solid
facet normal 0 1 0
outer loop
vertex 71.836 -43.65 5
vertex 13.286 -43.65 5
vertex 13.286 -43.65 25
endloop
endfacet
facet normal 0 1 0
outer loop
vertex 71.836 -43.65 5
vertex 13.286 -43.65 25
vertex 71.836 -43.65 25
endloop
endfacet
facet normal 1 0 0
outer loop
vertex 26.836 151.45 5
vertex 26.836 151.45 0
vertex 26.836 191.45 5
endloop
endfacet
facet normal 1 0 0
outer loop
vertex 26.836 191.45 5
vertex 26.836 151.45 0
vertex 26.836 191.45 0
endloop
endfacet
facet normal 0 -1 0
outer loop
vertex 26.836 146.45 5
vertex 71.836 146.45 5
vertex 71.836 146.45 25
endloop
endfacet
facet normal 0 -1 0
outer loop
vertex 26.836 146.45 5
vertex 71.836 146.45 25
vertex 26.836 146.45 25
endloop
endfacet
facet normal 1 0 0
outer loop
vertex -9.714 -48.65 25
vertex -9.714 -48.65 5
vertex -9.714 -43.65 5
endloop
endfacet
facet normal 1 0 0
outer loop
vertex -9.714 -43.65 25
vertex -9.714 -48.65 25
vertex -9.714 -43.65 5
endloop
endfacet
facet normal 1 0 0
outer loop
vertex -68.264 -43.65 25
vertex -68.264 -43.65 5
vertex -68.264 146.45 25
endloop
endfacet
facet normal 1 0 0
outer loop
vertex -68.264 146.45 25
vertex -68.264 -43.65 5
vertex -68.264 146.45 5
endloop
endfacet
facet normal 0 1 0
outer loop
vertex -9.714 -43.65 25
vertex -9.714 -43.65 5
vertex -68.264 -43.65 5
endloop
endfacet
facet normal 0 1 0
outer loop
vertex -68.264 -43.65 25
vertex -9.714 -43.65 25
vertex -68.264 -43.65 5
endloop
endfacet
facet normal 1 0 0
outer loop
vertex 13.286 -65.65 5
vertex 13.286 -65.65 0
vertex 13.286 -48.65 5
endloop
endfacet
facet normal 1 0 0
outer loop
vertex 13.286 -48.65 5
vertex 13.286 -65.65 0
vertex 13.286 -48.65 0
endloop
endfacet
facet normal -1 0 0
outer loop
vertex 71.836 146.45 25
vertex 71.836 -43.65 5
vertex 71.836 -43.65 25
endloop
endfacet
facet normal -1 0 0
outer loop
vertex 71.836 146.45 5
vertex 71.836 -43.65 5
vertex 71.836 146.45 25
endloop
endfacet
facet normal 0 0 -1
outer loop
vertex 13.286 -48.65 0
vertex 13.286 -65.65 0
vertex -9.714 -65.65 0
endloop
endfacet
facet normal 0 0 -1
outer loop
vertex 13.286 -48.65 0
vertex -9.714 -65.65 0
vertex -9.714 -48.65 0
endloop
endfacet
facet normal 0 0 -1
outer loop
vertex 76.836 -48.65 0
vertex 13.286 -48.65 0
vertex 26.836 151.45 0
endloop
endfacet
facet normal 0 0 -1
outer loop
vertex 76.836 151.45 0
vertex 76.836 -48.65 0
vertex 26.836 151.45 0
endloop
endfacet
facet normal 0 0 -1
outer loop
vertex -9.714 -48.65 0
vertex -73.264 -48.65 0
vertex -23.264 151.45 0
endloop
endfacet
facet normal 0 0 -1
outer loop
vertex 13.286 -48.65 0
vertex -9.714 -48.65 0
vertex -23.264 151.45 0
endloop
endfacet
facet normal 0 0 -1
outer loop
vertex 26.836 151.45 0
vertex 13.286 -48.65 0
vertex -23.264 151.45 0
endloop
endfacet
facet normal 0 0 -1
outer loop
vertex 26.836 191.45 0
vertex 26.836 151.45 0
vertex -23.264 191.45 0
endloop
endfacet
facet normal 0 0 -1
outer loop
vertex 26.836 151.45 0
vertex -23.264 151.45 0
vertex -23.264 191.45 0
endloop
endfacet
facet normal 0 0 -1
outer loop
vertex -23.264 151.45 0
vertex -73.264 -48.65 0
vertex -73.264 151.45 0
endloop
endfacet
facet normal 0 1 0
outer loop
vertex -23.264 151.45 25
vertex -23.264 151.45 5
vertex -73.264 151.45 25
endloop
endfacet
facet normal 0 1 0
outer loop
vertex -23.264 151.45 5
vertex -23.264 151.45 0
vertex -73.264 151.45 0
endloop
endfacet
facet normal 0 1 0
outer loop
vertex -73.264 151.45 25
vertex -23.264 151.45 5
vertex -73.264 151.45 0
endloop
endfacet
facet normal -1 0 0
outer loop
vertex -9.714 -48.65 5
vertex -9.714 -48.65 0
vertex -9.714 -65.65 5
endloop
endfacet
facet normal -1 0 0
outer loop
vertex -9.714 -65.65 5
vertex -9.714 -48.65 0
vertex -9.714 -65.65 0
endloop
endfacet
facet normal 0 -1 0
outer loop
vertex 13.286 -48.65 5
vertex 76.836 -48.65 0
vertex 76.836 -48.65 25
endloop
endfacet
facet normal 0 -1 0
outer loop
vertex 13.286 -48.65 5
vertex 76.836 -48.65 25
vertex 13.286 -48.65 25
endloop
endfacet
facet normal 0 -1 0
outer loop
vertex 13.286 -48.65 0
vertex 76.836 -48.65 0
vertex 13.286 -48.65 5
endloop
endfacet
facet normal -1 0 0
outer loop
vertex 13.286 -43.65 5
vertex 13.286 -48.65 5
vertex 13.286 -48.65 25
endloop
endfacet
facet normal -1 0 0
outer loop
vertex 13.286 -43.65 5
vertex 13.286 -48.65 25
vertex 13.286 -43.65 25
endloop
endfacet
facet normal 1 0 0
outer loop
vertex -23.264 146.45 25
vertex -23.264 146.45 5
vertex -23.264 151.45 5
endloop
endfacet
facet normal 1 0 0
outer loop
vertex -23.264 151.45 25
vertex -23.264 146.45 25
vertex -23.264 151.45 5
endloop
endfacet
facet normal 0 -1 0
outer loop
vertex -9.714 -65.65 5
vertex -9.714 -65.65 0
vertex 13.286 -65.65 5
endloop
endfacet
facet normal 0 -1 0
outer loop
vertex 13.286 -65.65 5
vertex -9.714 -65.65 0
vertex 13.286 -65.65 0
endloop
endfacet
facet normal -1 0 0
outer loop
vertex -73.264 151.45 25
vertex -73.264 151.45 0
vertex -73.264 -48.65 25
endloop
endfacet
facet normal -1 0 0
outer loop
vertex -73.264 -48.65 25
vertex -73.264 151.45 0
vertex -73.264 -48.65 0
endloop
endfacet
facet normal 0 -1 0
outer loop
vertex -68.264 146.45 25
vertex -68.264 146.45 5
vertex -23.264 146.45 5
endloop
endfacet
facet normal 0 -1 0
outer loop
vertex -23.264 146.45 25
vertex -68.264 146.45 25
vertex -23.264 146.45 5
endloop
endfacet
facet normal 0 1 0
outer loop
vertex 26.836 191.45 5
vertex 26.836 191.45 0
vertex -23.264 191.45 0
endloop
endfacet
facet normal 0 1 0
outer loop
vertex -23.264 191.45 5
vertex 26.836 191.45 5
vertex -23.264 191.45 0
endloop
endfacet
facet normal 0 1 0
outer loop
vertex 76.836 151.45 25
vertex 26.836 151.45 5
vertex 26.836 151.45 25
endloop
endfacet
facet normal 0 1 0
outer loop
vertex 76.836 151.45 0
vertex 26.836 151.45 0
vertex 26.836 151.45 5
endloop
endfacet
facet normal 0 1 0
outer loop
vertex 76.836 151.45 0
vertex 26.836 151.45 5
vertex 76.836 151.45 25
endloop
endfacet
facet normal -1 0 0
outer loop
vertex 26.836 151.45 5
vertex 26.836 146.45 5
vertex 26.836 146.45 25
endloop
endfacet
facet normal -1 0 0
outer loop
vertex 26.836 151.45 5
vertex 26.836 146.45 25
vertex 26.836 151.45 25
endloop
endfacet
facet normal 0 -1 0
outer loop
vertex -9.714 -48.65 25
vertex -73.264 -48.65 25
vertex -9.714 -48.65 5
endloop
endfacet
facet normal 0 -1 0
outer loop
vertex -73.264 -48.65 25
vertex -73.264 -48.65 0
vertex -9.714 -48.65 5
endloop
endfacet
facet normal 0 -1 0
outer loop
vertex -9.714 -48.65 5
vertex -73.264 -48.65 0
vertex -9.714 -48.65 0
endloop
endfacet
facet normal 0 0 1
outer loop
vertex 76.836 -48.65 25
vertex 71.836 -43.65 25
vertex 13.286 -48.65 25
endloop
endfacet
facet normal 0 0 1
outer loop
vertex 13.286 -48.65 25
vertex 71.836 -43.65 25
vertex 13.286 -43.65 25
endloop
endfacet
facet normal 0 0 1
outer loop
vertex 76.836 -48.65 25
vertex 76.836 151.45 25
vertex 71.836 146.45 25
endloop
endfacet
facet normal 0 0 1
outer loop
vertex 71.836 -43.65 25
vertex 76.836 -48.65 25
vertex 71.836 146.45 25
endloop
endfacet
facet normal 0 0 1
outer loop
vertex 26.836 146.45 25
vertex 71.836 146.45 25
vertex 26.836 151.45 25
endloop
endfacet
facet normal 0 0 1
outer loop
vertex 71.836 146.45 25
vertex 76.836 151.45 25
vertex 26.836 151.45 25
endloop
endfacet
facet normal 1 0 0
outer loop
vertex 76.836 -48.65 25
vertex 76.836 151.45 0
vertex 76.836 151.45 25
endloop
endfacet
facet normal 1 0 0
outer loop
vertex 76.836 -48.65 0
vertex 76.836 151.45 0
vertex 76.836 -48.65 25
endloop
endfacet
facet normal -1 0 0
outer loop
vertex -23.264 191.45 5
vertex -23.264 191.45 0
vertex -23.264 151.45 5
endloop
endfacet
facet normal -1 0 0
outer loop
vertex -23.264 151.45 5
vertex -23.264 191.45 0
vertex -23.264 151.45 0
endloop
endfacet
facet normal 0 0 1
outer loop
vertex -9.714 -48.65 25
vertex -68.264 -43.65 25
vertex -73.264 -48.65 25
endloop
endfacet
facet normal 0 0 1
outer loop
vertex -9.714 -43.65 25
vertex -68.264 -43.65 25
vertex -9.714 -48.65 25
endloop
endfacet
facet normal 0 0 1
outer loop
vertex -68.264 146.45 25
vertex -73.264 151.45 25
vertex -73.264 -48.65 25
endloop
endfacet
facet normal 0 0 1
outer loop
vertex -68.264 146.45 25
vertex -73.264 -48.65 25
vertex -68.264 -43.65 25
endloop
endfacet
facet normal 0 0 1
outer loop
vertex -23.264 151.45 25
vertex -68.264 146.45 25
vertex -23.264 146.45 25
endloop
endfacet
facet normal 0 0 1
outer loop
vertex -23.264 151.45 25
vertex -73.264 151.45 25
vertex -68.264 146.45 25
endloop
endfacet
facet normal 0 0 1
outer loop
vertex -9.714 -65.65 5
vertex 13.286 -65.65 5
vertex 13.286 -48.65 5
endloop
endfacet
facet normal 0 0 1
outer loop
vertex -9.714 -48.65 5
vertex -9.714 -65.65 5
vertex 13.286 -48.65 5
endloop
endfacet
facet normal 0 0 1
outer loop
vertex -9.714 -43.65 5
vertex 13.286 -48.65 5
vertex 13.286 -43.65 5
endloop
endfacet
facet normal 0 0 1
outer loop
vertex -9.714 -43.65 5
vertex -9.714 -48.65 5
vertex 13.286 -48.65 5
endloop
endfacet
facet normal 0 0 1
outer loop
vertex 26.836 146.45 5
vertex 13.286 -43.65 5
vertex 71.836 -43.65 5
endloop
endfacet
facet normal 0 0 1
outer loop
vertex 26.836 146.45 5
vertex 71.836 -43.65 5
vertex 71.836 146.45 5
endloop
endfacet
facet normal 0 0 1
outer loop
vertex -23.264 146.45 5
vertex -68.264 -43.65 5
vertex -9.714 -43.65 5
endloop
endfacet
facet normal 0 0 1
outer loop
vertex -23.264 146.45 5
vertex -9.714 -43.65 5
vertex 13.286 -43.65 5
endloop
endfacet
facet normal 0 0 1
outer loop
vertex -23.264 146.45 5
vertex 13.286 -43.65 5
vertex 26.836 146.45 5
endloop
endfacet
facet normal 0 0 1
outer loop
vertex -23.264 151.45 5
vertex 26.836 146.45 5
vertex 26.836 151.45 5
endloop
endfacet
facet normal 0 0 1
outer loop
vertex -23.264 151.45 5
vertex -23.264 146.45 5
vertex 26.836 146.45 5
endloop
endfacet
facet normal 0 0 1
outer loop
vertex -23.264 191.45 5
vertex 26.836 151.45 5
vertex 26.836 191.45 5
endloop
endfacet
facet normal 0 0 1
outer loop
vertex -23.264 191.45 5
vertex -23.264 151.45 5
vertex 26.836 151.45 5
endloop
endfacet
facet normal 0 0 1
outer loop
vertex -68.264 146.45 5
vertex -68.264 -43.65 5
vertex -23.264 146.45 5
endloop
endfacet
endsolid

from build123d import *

# Parameters (mm, degrees)
BOSS_EXTRUDE1_DEPTH = 5
BOSS_EXTRUDE4_DEPTH = 20
BOSS_EXTRUDE5_DEPTH = 20


with BuildPart() as part:
    # Sketch1 → Boss-Extrude1 (new body)
    with BuildSketch(Plane(origin=(0, 0, 0), x_dir=(0, 1, 0), z_dir=(0, 0, 1))):
        Polygon((-65.650485437, 9.713592233), (-65.650485437, -13.286407767), (-48.650485437, -13.286407767), (-48.650485437, -76.836407767), (151.449514563, -76.836407767), (151.449514563, -26.836407767), (191.449514563, -26.836407767), (191.449514563, 23.263592233), (151.449514563, 23.263592233), (151.449514563, 73.263592233), (-48.650485437, 73.263592233), (-48.650485437, 9.713592233), align=None)
    extrude(amount=BOSS_EXTRUDE1_DEPTH)

    # Sketch7 → Boss-Extrude4 (add)
    with BuildSketch(Plane.XY.offset(5)):
        Polygon((-23.263592233, 151.449514563), (-73.263592233, 151.449514563), (-73.263592233, -48.650485437), (-9.713592233, -48.650485437), (-9.713592233, -43.650485437), (-68.263592233, -43.650485437), (-68.263592233, 146.449514563), (-23.263592233, 146.449514563), align=None)
    extrude(amount=BOSS_EXTRUDE4_DEPTH)

    # Sketch9 → Boss-Extrude5 (add)
    with BuildSketch(Plane.XY.offset(5)):
        Polygon((26.836407767, 151.449514563), (76.836407767, 151.449514563), (76.836407767, -48.650485437), (13.286407767, -48.650485437), (13.286407767, -43.650485437), (71.836407767, -43.650485437), (71.836407767, 146.449514563), (26.836407767, 146.449514563), align=None)
    extrude(amount=BOSS_EXTRUDE5_DEPTH)


solid = part.part
